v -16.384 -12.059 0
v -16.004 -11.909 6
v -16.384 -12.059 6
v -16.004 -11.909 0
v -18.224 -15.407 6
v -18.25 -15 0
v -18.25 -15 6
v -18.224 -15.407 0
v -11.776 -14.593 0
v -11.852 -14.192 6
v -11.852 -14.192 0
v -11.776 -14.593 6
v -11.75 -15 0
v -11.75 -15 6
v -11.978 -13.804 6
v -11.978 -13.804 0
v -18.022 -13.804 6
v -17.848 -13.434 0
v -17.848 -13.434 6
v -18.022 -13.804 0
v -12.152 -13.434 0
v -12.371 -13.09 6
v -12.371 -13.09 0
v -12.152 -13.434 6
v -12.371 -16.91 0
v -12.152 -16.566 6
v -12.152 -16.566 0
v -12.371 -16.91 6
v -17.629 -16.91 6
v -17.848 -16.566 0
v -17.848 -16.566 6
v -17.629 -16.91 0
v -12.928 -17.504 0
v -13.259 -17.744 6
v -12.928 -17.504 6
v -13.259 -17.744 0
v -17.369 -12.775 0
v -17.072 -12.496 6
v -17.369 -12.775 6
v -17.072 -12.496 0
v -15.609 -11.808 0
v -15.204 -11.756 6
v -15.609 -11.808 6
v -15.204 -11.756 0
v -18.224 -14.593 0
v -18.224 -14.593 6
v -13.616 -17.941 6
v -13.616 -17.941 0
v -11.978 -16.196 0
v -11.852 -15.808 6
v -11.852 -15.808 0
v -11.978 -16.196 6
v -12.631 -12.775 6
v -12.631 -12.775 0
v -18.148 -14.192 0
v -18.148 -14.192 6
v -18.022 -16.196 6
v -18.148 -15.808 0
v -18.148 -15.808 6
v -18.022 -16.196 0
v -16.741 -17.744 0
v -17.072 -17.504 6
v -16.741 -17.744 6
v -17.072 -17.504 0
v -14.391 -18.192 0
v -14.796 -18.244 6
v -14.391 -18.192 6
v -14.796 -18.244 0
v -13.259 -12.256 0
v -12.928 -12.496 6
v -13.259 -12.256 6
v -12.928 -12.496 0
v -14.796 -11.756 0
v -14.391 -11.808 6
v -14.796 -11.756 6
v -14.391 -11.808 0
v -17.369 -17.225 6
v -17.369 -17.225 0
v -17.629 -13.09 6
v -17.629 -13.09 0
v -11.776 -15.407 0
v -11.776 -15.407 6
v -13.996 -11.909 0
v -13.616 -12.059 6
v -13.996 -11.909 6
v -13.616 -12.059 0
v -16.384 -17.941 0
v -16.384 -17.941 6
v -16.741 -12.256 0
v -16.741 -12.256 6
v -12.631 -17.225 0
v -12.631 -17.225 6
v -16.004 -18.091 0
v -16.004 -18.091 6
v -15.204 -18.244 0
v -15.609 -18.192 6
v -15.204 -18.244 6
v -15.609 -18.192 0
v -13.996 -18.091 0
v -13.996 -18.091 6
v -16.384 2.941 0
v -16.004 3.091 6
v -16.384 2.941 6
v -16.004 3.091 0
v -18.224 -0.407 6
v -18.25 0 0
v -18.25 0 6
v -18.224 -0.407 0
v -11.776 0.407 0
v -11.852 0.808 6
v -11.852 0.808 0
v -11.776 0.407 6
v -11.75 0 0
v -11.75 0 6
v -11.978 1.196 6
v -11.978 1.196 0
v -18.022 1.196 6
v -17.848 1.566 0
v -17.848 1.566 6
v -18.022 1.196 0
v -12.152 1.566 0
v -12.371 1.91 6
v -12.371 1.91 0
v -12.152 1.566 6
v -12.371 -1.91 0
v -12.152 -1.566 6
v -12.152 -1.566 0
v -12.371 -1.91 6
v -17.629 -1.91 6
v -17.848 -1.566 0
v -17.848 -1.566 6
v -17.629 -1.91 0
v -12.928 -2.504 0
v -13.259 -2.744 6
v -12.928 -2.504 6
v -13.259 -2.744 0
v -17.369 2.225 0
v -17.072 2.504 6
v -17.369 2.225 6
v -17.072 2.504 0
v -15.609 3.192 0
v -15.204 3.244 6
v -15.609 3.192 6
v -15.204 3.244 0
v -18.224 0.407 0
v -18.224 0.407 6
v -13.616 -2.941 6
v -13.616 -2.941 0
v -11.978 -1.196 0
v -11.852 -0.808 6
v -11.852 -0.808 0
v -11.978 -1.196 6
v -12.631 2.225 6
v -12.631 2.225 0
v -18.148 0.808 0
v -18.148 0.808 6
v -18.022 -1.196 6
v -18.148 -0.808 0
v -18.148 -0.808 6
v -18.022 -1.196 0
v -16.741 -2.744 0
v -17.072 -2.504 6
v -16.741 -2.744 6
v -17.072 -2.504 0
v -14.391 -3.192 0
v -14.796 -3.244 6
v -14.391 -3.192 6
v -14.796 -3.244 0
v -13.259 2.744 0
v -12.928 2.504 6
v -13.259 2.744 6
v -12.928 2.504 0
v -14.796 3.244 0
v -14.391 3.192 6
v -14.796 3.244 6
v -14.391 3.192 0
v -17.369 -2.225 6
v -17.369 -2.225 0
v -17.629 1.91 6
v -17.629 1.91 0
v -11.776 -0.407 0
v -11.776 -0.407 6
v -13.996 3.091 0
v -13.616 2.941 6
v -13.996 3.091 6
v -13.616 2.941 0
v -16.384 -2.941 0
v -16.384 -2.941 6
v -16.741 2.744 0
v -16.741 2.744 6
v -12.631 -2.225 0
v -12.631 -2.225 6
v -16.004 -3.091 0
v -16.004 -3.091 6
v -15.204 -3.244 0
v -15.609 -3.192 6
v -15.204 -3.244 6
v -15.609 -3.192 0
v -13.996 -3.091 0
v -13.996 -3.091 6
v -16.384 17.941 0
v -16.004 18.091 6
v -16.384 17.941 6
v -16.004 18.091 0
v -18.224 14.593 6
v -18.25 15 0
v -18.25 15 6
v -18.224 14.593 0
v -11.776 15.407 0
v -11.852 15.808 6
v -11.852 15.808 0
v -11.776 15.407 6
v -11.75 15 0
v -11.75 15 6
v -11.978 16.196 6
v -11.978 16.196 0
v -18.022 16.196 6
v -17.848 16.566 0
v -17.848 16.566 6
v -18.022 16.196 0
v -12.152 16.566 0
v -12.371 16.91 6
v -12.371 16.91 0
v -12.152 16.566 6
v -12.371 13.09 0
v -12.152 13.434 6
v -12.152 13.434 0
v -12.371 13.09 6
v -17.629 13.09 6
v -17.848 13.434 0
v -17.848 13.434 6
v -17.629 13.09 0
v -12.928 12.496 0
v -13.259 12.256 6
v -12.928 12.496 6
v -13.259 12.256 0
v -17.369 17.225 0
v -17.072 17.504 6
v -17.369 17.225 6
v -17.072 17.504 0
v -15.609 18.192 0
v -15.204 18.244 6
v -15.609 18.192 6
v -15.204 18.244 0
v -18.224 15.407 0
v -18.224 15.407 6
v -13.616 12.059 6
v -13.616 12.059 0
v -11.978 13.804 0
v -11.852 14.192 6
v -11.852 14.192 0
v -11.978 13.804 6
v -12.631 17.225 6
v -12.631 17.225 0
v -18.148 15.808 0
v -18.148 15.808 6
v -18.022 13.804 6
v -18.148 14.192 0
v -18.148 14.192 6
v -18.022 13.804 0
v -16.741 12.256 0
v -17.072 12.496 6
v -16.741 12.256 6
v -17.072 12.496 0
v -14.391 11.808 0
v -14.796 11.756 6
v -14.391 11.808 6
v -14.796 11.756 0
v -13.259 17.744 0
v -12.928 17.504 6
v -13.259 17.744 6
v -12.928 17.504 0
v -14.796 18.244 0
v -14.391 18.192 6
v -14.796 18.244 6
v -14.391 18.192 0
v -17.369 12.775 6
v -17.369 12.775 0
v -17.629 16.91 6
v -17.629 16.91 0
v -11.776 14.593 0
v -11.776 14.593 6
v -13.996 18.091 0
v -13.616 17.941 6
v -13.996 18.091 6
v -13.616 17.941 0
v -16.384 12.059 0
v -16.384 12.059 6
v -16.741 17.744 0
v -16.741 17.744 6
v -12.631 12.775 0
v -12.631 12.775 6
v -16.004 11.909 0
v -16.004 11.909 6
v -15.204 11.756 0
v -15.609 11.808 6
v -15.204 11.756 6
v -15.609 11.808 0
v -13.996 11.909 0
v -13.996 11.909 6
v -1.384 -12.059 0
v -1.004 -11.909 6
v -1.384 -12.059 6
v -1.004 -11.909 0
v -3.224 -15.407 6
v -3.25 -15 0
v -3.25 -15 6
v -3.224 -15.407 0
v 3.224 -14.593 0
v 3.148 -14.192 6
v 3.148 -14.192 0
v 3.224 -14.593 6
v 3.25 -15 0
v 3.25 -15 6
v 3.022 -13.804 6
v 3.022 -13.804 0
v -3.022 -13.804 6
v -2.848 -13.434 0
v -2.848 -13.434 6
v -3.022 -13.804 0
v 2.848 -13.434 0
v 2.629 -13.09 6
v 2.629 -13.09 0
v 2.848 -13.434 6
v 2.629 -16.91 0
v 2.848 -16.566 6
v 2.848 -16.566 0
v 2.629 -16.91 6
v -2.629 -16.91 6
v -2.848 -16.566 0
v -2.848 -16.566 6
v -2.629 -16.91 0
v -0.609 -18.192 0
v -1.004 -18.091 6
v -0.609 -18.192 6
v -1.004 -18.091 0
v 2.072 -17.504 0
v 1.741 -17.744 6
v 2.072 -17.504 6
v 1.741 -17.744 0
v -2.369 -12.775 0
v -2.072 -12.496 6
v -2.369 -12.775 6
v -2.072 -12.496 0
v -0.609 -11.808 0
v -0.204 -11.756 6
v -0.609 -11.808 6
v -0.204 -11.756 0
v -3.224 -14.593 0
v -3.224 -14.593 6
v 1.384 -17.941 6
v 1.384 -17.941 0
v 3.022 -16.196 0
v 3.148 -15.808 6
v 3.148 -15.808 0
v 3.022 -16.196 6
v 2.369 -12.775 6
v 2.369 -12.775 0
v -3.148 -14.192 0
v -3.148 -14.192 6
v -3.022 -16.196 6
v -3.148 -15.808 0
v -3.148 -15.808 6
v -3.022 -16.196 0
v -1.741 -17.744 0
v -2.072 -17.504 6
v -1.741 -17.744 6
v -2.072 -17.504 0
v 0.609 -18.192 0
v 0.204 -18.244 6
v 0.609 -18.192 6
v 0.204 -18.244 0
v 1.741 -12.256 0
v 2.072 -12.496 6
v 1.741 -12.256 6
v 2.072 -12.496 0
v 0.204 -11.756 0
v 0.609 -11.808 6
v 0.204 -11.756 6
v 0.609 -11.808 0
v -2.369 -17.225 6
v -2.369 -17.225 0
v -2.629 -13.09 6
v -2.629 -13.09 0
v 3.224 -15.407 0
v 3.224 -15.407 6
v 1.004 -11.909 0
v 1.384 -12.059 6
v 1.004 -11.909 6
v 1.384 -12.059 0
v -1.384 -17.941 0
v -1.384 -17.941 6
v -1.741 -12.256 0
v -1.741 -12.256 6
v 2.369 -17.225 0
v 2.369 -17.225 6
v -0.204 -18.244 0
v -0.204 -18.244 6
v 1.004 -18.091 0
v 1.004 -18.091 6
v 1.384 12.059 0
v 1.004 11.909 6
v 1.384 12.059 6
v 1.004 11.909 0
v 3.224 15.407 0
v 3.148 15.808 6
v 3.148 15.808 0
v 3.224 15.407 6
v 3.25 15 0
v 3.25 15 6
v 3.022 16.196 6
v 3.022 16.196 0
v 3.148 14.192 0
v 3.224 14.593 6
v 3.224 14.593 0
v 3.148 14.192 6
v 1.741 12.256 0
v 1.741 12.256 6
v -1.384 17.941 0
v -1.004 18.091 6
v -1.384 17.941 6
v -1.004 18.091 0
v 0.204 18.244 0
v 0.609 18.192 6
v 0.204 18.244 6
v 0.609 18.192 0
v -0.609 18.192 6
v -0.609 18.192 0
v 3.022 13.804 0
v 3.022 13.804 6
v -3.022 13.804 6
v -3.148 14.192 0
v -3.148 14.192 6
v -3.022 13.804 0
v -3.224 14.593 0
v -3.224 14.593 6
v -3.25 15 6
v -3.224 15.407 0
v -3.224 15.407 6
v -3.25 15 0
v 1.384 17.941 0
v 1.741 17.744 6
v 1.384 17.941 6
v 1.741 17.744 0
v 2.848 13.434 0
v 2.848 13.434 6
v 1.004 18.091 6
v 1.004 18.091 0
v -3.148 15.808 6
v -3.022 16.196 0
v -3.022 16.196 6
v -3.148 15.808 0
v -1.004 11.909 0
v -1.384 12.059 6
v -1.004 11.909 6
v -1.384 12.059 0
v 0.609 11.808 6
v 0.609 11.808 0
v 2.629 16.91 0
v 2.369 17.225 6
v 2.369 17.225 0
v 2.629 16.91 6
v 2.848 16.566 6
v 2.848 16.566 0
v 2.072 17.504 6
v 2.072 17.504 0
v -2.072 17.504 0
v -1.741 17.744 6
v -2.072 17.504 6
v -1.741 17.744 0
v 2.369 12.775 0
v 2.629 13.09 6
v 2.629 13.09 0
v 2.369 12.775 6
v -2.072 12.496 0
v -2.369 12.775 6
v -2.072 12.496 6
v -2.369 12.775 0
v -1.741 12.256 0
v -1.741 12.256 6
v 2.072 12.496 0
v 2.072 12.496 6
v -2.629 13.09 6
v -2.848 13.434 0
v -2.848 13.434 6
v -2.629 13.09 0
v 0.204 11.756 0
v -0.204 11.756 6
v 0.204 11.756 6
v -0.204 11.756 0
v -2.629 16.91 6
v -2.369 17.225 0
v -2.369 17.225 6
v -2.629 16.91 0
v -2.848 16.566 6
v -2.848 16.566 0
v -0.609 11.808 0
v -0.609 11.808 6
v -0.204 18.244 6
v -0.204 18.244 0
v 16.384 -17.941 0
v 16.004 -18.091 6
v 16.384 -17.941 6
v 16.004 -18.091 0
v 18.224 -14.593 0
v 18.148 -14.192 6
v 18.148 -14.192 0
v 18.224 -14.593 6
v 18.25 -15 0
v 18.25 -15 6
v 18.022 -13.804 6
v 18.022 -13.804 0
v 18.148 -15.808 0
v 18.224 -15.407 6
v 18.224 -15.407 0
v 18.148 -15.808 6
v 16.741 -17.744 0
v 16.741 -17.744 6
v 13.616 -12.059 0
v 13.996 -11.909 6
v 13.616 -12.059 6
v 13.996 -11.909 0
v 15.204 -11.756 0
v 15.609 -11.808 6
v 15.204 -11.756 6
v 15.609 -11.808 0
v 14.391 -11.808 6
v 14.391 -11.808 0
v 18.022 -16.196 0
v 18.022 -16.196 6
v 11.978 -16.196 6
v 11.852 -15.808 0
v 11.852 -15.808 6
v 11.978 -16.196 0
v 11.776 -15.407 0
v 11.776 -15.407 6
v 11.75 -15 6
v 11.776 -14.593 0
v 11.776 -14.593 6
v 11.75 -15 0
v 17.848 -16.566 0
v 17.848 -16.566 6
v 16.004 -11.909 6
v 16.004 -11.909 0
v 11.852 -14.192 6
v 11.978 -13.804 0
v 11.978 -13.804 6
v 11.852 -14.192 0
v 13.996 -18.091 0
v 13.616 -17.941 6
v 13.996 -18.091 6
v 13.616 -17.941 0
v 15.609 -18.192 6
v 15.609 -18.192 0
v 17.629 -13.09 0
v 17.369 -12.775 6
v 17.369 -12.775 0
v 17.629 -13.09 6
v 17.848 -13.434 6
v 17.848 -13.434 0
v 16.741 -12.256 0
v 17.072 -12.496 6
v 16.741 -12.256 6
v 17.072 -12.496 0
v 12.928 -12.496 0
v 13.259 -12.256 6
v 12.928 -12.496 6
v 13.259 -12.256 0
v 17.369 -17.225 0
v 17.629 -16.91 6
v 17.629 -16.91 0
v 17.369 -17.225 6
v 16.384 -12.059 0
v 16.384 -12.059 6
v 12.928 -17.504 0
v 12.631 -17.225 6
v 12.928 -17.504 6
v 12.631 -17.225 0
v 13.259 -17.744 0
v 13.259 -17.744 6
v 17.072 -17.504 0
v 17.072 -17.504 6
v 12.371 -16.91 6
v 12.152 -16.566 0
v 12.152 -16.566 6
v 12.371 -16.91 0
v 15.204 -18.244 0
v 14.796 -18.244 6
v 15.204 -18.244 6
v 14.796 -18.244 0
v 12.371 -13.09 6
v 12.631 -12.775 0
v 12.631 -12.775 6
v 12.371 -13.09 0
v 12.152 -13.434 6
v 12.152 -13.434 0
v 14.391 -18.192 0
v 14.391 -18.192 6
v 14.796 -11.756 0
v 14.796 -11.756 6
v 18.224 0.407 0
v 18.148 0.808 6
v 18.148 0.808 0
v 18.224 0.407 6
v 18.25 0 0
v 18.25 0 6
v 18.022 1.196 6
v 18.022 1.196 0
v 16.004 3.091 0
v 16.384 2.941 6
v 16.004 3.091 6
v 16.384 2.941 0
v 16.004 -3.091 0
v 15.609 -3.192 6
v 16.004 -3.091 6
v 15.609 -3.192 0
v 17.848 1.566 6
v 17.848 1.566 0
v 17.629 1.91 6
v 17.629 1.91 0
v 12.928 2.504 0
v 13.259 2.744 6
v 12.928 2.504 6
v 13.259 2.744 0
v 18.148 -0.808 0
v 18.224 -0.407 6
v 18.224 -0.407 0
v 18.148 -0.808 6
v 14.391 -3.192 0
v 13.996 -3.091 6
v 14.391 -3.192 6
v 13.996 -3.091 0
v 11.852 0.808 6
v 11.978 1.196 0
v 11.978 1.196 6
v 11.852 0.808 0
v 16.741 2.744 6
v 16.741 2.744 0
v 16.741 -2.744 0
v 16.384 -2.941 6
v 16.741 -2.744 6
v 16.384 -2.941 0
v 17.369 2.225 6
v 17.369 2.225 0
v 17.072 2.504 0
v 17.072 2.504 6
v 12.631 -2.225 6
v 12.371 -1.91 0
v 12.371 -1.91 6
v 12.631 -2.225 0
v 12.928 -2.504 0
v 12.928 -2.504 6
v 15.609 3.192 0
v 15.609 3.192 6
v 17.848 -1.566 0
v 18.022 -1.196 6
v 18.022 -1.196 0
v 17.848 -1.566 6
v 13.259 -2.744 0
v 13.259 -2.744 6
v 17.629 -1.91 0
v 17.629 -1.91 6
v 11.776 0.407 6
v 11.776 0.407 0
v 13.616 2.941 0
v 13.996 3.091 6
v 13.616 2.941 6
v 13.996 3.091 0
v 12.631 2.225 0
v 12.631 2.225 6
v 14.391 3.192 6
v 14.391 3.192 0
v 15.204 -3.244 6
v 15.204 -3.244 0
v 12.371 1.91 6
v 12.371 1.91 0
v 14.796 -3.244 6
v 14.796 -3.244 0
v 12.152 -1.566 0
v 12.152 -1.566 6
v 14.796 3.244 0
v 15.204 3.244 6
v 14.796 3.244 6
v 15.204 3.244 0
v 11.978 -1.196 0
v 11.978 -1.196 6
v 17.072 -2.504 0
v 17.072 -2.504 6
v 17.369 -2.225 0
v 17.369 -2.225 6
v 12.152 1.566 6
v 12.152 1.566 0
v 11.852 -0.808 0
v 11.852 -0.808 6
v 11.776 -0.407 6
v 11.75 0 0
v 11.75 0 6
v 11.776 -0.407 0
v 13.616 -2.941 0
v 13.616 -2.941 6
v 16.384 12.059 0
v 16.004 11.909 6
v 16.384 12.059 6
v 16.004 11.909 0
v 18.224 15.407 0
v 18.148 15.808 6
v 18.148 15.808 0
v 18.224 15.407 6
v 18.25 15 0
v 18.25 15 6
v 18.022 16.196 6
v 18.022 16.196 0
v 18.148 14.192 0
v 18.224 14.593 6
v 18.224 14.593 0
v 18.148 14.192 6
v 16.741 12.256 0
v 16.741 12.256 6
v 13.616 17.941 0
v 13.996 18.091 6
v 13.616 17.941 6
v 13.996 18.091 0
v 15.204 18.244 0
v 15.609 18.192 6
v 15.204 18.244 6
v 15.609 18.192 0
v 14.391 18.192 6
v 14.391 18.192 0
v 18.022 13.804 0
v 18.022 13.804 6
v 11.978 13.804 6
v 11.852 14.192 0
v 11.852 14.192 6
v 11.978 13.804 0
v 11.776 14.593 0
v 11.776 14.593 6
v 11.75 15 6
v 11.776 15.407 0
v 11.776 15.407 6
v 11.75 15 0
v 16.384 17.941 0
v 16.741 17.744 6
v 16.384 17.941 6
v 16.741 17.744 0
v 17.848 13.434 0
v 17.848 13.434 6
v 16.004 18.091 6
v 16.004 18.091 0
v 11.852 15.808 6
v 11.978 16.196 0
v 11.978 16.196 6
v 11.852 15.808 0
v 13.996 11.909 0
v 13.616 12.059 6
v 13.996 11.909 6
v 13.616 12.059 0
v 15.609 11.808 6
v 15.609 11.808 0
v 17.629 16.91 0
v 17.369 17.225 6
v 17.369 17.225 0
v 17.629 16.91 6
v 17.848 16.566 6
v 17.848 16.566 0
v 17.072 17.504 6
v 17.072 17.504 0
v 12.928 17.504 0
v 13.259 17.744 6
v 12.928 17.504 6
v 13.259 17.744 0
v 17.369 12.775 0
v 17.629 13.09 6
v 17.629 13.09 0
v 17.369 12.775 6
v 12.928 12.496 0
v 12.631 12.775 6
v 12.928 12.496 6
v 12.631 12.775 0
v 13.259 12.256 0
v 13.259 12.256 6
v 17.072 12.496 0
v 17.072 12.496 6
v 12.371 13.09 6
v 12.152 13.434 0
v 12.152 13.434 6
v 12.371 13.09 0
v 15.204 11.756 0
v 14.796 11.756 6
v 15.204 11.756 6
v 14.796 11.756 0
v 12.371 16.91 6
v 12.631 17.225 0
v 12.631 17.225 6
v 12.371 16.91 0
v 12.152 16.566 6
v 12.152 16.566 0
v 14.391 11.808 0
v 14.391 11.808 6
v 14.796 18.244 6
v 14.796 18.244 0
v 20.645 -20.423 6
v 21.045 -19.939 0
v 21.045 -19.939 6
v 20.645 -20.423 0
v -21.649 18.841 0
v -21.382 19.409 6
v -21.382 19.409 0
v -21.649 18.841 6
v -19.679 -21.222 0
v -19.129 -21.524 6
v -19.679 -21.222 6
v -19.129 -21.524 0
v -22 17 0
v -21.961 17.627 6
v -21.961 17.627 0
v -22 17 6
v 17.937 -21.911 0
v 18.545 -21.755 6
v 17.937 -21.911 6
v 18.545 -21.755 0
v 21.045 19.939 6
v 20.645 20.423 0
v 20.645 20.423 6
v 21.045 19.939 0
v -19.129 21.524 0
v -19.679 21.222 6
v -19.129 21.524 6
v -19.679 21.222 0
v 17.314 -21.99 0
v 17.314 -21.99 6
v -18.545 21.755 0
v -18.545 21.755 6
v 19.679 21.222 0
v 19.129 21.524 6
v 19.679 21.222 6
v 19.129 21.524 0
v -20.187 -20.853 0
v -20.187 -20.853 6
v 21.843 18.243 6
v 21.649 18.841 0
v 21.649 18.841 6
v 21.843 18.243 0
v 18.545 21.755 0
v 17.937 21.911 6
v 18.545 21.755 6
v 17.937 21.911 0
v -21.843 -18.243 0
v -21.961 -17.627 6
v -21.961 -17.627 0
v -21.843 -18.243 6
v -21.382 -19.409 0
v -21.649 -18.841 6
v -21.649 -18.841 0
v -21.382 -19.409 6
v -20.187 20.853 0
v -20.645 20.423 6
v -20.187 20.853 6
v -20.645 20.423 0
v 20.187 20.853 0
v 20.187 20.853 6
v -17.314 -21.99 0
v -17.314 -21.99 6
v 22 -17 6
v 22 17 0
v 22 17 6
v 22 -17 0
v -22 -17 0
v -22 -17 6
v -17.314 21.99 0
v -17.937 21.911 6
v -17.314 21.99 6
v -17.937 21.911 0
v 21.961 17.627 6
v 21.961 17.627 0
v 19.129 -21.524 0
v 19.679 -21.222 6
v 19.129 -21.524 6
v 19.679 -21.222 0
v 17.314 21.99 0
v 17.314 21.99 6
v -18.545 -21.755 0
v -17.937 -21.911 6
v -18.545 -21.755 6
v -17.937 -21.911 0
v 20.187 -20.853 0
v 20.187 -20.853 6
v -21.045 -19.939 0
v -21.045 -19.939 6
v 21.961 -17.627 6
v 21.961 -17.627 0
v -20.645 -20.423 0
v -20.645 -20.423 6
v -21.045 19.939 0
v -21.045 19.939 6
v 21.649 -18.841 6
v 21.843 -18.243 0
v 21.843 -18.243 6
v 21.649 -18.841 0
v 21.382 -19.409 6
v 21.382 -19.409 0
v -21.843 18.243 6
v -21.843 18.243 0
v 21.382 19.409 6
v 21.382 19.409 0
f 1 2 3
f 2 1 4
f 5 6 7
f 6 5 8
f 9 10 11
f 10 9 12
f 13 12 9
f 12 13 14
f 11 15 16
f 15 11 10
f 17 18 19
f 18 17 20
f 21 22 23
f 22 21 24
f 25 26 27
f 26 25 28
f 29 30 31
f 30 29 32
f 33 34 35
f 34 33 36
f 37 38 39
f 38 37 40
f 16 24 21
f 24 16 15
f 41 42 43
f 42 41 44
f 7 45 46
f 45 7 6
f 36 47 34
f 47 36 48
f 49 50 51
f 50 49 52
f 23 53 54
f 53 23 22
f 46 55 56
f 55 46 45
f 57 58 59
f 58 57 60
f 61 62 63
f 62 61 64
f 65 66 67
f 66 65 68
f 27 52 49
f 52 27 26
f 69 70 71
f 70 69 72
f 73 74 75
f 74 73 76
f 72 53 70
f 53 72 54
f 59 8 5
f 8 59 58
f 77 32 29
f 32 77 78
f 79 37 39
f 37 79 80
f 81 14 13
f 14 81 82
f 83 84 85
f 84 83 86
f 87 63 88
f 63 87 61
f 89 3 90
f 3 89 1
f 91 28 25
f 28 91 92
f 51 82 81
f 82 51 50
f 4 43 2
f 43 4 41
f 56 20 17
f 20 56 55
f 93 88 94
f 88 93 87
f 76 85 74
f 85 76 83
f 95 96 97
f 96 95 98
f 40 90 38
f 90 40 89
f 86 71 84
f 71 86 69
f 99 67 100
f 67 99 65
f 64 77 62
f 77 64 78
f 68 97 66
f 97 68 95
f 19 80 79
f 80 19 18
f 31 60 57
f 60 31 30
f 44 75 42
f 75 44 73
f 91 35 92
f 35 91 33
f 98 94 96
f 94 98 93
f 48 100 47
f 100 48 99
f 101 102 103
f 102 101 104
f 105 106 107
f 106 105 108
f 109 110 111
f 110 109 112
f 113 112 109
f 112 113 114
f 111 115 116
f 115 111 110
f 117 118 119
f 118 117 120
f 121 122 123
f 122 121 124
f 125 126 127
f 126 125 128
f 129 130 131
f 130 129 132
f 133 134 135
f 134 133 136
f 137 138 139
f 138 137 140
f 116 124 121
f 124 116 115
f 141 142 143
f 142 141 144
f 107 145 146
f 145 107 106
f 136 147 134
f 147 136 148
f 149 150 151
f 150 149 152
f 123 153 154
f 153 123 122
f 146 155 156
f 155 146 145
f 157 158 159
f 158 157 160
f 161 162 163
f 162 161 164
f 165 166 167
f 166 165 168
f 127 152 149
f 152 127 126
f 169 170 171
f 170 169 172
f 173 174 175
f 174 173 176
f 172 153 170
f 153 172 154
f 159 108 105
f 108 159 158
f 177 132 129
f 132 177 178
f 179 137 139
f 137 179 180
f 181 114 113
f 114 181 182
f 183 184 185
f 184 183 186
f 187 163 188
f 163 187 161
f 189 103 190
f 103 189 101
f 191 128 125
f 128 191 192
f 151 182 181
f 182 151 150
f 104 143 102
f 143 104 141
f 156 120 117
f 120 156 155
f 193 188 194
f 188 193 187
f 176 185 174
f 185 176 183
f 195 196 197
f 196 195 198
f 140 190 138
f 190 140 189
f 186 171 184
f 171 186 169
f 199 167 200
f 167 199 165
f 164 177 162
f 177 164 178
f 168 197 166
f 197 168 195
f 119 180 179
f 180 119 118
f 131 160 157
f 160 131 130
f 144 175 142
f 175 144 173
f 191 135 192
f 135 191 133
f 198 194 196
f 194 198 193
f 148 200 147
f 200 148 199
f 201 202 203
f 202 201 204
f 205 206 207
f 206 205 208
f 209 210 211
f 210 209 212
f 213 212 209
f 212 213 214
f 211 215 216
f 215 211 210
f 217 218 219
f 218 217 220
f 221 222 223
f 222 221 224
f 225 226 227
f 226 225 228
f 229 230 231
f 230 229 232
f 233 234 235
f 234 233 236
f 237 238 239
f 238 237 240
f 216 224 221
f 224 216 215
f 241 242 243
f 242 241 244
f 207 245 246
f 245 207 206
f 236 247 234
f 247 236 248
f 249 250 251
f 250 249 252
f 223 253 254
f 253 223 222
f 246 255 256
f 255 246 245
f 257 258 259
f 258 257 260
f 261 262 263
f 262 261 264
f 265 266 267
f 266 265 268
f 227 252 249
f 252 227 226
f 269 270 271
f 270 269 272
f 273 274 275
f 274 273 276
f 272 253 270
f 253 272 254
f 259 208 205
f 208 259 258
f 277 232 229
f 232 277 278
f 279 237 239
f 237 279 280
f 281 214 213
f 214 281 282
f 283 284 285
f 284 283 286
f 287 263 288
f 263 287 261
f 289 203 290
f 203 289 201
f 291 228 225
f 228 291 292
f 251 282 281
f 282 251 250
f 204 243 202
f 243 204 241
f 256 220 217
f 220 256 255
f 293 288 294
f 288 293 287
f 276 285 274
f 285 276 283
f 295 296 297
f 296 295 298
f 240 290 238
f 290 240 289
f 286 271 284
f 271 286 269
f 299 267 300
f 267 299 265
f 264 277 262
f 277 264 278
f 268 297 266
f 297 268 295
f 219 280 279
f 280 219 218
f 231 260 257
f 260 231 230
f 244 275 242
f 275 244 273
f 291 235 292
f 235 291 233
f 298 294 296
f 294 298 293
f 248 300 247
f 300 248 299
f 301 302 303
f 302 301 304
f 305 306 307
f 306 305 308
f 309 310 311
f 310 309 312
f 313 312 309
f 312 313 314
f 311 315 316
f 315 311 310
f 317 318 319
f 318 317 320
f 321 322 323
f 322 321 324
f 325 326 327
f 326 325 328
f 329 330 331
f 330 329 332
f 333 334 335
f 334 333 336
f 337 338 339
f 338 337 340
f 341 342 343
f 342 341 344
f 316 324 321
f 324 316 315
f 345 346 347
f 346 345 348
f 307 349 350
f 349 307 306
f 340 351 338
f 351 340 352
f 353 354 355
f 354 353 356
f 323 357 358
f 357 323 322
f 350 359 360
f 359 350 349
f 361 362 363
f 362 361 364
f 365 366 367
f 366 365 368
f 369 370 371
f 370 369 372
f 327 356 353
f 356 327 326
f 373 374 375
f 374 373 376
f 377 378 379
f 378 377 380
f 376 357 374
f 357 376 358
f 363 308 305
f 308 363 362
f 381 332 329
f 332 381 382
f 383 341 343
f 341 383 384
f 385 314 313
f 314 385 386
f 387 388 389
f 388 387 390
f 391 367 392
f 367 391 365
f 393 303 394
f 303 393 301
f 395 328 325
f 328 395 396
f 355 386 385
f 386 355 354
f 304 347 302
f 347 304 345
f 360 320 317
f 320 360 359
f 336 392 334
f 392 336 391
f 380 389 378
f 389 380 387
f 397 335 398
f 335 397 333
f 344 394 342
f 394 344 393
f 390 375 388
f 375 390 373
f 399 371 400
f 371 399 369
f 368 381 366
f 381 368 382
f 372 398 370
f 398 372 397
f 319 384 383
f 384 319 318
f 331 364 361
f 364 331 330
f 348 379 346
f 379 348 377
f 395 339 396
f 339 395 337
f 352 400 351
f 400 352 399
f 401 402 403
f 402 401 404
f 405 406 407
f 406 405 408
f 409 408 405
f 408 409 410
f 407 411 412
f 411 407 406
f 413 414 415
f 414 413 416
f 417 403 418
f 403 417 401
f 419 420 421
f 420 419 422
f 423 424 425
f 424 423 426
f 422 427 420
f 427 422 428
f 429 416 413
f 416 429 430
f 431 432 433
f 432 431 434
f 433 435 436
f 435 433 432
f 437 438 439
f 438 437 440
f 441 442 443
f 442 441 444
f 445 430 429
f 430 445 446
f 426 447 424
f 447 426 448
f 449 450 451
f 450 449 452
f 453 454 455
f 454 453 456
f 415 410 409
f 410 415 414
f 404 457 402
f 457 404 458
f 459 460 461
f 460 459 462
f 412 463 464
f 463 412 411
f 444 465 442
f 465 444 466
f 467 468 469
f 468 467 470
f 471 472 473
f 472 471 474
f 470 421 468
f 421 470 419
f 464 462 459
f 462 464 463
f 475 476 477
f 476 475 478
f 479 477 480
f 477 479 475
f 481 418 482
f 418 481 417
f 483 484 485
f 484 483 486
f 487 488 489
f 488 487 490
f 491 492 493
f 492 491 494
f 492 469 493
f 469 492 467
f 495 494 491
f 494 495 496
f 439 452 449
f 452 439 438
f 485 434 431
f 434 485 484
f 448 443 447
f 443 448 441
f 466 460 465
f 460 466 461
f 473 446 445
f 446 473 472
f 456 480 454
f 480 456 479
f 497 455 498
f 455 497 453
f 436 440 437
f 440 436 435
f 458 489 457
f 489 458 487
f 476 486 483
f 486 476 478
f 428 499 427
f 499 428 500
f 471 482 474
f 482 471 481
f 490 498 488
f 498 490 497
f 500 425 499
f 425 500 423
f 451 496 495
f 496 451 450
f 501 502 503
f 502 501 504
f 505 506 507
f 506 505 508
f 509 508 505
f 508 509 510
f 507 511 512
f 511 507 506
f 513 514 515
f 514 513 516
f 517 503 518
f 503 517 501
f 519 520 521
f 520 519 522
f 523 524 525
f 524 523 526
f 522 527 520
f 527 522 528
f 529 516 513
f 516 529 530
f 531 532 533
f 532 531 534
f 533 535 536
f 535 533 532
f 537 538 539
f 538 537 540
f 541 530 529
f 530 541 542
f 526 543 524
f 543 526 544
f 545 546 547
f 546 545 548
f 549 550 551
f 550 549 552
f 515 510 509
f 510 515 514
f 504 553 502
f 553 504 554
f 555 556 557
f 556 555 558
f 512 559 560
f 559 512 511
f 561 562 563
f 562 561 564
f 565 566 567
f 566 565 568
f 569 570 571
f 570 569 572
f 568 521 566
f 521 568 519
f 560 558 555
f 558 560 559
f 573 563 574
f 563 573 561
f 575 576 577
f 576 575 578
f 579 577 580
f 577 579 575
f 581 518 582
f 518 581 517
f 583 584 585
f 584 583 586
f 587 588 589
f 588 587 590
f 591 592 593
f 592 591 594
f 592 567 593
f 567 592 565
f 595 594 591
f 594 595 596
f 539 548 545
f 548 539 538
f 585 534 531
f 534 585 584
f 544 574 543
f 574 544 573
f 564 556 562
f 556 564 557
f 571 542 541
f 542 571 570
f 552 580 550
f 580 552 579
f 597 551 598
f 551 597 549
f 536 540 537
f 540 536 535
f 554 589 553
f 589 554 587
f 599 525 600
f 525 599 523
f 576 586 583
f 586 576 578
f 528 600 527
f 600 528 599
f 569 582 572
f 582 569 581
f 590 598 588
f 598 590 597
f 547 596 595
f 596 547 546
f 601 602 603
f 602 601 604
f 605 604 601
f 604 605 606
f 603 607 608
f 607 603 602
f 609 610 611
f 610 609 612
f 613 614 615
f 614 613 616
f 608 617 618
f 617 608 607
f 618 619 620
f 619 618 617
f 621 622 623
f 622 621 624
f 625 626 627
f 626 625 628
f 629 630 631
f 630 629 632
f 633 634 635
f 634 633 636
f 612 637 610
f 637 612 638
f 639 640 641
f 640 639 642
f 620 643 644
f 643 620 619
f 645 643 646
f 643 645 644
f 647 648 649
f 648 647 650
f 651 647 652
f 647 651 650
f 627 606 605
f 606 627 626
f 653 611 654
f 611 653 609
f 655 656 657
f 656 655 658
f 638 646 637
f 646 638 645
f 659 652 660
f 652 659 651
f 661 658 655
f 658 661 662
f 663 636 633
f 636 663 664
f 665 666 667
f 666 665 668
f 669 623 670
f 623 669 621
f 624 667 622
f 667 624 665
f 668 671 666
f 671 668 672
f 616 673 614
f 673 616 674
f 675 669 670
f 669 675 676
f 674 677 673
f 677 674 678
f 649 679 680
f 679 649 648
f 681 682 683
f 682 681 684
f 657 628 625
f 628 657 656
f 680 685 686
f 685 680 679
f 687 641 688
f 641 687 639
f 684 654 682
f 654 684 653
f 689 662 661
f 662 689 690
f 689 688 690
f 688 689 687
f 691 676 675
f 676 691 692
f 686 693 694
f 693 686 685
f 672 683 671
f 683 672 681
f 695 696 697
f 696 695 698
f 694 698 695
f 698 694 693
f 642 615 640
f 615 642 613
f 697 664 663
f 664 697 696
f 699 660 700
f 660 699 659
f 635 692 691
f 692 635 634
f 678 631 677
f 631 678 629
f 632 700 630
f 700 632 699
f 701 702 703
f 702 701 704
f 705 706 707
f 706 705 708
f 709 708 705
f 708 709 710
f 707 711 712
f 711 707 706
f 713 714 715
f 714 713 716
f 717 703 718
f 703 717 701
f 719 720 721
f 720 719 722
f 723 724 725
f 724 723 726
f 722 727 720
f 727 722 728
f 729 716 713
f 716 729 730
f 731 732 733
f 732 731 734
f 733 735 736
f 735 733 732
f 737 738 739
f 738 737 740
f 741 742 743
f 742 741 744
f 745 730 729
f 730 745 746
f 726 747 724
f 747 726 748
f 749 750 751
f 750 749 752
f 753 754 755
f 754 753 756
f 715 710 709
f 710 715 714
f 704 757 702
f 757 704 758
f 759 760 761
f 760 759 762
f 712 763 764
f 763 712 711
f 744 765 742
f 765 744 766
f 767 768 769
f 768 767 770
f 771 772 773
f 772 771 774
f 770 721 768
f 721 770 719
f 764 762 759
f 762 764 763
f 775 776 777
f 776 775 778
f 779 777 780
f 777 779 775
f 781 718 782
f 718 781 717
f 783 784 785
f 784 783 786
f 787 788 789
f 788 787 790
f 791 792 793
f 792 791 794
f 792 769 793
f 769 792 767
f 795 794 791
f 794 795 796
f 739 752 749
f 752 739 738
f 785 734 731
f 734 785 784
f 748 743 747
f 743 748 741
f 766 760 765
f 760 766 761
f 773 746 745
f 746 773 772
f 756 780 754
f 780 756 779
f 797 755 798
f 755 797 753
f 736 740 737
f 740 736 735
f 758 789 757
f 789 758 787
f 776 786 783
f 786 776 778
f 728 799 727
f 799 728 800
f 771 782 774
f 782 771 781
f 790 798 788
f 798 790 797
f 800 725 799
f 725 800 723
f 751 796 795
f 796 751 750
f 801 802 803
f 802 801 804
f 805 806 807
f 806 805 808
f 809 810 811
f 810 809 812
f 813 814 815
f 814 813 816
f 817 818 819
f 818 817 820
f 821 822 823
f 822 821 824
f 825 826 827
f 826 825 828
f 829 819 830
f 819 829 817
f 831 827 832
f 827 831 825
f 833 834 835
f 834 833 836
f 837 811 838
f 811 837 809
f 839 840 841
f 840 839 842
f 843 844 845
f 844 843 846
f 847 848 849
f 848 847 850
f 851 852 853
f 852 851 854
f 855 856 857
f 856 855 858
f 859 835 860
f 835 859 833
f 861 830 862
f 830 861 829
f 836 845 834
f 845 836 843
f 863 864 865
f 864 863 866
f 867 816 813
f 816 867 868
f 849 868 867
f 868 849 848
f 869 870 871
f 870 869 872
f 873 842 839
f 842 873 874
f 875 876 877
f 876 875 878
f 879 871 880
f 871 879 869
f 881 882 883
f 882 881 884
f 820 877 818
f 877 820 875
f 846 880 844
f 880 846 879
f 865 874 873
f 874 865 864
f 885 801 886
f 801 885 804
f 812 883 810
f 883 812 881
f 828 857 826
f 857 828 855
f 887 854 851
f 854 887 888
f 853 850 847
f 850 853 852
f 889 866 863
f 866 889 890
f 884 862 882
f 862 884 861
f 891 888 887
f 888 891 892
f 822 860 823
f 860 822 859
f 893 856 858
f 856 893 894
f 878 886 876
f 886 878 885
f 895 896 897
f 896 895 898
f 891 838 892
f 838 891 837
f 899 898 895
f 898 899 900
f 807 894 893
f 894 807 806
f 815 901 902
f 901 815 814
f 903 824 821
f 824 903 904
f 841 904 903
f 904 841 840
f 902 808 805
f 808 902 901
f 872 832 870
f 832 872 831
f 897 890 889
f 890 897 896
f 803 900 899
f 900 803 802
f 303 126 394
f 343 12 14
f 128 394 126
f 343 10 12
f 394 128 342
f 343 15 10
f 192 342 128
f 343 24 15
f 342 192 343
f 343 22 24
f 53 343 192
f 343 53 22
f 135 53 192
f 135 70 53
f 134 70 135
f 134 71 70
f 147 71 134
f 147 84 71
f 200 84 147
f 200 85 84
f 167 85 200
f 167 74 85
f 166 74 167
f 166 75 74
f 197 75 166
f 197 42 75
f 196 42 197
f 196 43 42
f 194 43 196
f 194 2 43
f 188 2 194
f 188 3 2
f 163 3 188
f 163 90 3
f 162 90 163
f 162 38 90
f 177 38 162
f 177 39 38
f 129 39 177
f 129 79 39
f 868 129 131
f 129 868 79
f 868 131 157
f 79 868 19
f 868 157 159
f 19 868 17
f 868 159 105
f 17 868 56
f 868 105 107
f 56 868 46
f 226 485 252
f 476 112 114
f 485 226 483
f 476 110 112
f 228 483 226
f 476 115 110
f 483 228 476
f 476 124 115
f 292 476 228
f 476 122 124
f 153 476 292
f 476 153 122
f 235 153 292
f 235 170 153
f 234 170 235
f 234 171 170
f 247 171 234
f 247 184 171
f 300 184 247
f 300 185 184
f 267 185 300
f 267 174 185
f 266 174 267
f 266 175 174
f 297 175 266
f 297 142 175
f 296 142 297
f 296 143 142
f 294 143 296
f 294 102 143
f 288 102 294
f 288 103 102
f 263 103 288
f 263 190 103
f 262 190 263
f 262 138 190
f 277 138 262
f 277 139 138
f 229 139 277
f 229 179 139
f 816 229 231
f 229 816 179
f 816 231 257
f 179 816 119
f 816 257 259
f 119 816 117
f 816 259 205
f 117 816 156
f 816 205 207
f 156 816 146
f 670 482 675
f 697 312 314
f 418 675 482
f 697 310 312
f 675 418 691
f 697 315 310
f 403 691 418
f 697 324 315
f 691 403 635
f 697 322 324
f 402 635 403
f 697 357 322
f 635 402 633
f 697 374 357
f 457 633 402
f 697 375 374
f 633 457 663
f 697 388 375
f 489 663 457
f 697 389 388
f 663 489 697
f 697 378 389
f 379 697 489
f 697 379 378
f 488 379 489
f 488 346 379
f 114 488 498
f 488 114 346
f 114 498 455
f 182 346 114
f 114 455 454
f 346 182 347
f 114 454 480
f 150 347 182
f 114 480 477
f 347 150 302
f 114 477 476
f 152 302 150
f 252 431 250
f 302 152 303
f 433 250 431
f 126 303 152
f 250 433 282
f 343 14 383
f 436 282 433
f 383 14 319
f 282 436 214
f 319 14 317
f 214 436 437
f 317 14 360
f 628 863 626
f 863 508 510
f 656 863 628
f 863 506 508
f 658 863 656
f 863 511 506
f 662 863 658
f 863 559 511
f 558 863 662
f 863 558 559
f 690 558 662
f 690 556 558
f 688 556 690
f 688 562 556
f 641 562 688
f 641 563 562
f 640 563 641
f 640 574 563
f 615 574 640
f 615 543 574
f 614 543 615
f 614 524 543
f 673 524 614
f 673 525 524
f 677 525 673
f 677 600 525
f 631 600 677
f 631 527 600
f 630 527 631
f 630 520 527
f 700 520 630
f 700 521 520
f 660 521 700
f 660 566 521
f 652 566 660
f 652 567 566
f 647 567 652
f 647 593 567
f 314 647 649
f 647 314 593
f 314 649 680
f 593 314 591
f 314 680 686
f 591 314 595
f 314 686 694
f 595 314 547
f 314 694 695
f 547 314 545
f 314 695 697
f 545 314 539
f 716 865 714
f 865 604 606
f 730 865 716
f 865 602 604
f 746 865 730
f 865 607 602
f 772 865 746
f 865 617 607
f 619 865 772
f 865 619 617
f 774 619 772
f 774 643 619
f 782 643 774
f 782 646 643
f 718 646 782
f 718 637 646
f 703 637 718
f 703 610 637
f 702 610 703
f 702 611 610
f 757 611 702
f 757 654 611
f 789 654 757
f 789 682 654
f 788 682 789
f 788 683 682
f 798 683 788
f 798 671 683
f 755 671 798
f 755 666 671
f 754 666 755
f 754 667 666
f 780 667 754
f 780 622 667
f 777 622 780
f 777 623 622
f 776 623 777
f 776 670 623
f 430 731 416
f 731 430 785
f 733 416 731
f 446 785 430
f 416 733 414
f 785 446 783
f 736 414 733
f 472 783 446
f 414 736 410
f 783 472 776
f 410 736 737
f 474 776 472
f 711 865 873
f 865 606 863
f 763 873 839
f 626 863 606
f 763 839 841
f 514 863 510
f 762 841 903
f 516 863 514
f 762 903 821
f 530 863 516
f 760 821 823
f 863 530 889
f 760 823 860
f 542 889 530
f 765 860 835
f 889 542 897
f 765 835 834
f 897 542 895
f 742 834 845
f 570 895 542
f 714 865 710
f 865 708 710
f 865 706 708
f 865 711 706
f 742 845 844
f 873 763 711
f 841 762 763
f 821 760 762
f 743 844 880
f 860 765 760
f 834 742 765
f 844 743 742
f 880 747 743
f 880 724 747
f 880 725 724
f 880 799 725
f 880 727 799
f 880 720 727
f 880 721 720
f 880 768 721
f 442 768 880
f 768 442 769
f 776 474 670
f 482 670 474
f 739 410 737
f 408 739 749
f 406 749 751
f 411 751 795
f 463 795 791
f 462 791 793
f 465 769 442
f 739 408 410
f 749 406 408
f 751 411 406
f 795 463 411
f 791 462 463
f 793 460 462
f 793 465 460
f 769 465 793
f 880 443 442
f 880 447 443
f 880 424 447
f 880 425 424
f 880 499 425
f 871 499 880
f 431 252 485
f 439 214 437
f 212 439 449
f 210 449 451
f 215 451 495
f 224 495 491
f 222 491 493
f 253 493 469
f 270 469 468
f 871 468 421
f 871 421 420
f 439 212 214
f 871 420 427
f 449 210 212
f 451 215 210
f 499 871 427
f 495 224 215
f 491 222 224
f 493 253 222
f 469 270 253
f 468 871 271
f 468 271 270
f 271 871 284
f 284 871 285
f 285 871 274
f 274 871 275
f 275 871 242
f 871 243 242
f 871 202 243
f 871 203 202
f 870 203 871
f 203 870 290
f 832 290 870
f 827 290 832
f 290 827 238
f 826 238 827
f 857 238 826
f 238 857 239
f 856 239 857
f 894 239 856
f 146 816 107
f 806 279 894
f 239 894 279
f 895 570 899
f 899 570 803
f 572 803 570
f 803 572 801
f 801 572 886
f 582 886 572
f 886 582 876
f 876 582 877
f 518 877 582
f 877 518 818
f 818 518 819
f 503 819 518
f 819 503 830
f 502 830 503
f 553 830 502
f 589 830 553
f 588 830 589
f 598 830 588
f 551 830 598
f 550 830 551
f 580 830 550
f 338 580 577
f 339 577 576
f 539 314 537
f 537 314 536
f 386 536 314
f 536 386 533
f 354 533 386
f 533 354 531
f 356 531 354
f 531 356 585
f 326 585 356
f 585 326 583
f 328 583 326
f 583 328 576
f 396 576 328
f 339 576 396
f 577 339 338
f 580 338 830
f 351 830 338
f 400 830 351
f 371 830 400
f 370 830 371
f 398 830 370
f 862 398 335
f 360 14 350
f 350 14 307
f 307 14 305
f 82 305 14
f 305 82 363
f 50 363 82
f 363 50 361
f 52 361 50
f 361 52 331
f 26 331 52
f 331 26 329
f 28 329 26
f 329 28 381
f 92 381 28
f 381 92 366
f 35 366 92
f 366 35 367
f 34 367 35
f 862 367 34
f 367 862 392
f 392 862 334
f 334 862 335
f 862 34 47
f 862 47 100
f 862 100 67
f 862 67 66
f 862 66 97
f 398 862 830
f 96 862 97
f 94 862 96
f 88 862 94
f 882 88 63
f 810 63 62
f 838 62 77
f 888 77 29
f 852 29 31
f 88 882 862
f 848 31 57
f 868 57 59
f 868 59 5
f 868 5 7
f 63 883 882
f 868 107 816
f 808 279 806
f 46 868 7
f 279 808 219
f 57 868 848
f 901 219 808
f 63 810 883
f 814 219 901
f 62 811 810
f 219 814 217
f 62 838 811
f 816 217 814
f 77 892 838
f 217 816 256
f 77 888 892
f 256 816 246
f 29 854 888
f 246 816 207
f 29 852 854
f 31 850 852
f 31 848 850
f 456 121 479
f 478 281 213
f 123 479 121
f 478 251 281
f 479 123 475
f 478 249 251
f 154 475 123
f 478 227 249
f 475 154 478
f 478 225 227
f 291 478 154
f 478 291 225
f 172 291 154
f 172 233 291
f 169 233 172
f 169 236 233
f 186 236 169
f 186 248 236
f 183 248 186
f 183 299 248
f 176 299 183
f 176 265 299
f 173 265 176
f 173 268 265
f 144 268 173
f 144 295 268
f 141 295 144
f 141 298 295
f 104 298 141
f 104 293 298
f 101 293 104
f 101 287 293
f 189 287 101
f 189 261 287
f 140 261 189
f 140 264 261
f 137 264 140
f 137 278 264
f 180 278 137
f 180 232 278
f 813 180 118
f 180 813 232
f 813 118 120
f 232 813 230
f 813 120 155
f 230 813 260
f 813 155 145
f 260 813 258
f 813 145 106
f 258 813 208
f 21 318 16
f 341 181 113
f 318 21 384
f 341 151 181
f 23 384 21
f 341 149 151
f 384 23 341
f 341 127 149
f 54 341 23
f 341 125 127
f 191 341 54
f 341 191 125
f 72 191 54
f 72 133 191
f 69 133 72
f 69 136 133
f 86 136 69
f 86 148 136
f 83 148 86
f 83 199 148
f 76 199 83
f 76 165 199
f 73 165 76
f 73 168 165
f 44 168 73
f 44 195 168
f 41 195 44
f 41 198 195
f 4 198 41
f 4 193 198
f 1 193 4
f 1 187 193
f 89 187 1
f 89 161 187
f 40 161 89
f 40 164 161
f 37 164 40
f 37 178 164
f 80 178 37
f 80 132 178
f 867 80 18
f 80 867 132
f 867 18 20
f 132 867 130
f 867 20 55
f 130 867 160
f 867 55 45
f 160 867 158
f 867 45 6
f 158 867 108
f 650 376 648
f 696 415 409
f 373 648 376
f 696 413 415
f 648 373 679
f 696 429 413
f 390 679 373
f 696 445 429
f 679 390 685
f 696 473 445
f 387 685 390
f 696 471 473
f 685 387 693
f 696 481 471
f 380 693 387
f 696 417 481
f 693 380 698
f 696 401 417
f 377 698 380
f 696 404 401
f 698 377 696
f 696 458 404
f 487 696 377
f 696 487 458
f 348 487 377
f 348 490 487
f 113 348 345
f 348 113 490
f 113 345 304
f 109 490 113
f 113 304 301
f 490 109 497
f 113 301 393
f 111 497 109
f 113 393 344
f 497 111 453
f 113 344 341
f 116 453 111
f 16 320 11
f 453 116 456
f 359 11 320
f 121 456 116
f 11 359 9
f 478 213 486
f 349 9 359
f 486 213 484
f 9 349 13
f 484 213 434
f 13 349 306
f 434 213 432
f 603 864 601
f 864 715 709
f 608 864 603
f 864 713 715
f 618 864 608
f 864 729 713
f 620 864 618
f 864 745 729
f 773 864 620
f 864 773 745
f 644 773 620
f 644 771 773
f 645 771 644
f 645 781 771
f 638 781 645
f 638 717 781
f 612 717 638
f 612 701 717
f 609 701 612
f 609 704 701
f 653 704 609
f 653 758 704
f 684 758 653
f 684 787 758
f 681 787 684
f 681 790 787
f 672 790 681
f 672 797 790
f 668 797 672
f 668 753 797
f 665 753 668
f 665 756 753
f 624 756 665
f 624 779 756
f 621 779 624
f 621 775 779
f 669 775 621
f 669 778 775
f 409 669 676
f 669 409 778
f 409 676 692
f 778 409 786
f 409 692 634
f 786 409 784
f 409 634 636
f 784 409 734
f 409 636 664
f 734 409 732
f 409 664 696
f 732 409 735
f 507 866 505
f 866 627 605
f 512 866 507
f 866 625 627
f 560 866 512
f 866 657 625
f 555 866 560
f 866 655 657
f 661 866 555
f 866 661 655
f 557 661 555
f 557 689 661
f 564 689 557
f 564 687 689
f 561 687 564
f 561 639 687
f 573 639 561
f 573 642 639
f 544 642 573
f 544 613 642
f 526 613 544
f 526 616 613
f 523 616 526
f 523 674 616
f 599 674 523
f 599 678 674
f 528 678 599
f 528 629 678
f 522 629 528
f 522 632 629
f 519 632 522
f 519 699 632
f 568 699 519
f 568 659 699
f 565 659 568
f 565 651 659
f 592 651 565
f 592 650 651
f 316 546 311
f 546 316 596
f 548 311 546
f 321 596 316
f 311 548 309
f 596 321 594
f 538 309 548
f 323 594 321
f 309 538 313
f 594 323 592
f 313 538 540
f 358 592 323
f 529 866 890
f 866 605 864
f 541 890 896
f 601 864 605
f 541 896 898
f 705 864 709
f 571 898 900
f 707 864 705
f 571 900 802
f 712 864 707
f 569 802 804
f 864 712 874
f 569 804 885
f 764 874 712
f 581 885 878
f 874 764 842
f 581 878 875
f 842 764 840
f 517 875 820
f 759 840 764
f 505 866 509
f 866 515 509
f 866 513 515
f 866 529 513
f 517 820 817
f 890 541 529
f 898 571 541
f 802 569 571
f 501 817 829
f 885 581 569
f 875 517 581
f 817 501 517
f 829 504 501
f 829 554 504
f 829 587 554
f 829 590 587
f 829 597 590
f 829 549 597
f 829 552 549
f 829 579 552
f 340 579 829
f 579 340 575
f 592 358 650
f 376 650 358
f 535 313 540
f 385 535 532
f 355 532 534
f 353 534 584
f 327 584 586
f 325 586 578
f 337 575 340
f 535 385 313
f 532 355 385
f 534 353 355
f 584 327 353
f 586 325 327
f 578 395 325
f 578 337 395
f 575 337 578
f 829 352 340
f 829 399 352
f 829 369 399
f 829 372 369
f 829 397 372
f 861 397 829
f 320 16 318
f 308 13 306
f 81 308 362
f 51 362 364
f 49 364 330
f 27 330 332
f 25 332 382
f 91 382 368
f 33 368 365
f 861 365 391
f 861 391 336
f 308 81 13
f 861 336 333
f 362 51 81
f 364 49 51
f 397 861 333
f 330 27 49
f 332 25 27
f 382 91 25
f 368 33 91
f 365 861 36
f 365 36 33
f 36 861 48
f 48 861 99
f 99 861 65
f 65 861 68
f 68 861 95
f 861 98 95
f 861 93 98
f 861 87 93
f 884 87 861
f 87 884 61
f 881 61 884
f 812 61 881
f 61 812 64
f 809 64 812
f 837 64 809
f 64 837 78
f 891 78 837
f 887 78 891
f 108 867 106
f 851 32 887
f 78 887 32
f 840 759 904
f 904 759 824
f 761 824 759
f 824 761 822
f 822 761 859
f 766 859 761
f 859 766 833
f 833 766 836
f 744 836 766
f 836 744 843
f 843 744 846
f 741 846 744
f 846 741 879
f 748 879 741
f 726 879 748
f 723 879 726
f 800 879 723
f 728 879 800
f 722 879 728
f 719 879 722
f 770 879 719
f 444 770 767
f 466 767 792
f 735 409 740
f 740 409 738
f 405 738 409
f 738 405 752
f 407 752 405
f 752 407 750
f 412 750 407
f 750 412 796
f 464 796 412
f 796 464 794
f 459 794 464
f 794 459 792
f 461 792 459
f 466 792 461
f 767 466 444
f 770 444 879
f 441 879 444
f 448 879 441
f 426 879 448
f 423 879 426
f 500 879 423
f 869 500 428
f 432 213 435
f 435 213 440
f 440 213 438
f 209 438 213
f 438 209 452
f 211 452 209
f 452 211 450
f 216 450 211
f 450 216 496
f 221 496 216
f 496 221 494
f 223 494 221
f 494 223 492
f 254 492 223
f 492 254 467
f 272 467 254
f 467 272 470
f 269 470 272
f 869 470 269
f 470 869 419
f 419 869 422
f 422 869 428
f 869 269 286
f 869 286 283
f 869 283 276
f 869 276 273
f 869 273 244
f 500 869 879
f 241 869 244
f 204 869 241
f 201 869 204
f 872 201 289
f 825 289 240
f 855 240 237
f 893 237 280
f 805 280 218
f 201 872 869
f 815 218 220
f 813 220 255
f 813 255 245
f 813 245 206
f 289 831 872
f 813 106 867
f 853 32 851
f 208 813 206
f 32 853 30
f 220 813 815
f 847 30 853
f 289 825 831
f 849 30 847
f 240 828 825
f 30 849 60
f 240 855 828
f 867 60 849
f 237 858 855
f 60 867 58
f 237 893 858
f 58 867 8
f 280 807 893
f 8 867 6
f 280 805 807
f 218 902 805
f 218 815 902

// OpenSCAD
$fn = 50;


difference() {
	union() {
		hull() {
			translate(v = [-17.0000000000, 17.0000000000, 0]) {
				cylinder(h = 6, r = 5);
			}
			translate(v = [17.0000000000, 17.0000000000, 0]) {
				cylinder(h = 6, r = 5);
			}
			translate(v = [-17.0000000000, -17.0000000000, 0]) {
				cylinder(h = 6, r = 5);
			}
			translate(v = [17.0000000000, -17.0000000000, 0]) {
				cylinder(h = 6, r = 5);
			}
		}
	}
	union() {
		translate(v = [-15.0000000000, -15.0000000000, -100.0000000000]) {
			cylinder(h = 200, r = 3.2500000000);
		}
		translate(v = [-15.0000000000, 0.0000000000, -100.0000000000]) {
			cylinder(h = 200, r = 3.2500000000);
		}
		translate(v = [-15.0000000000, 15.0000000000, -100.0000000000]) {
			cylinder(h = 200, r = 3.2500000000);
		}
		translate(v = [0.0000000000, -15.0000000000, -100.0000000000]) {
			cylinder(h = 200, r = 3.2500000000);
		}
		translate(v = [0.0000000000, 15.0000000000, -100.0000000000]) {
			cylinder(h = 200, r = 3.2500000000);
		}
		translate(v = [15.0000000000, -15.0000000000, -100.0000000000]) {
			cylinder(h = 200, r = 3.2500000000);
		}
		translate(v = [15.0000000000, 0.0000000000, -100.0000000000]) {
			cylinder(h = 200, r = 3.2500000000);
		}
		translate(v = [15.0000000000, 15.0000000000, -100.0000000000]) {
			cylinder(h = 200, r = 3.2500000000);
		}
	}
}
